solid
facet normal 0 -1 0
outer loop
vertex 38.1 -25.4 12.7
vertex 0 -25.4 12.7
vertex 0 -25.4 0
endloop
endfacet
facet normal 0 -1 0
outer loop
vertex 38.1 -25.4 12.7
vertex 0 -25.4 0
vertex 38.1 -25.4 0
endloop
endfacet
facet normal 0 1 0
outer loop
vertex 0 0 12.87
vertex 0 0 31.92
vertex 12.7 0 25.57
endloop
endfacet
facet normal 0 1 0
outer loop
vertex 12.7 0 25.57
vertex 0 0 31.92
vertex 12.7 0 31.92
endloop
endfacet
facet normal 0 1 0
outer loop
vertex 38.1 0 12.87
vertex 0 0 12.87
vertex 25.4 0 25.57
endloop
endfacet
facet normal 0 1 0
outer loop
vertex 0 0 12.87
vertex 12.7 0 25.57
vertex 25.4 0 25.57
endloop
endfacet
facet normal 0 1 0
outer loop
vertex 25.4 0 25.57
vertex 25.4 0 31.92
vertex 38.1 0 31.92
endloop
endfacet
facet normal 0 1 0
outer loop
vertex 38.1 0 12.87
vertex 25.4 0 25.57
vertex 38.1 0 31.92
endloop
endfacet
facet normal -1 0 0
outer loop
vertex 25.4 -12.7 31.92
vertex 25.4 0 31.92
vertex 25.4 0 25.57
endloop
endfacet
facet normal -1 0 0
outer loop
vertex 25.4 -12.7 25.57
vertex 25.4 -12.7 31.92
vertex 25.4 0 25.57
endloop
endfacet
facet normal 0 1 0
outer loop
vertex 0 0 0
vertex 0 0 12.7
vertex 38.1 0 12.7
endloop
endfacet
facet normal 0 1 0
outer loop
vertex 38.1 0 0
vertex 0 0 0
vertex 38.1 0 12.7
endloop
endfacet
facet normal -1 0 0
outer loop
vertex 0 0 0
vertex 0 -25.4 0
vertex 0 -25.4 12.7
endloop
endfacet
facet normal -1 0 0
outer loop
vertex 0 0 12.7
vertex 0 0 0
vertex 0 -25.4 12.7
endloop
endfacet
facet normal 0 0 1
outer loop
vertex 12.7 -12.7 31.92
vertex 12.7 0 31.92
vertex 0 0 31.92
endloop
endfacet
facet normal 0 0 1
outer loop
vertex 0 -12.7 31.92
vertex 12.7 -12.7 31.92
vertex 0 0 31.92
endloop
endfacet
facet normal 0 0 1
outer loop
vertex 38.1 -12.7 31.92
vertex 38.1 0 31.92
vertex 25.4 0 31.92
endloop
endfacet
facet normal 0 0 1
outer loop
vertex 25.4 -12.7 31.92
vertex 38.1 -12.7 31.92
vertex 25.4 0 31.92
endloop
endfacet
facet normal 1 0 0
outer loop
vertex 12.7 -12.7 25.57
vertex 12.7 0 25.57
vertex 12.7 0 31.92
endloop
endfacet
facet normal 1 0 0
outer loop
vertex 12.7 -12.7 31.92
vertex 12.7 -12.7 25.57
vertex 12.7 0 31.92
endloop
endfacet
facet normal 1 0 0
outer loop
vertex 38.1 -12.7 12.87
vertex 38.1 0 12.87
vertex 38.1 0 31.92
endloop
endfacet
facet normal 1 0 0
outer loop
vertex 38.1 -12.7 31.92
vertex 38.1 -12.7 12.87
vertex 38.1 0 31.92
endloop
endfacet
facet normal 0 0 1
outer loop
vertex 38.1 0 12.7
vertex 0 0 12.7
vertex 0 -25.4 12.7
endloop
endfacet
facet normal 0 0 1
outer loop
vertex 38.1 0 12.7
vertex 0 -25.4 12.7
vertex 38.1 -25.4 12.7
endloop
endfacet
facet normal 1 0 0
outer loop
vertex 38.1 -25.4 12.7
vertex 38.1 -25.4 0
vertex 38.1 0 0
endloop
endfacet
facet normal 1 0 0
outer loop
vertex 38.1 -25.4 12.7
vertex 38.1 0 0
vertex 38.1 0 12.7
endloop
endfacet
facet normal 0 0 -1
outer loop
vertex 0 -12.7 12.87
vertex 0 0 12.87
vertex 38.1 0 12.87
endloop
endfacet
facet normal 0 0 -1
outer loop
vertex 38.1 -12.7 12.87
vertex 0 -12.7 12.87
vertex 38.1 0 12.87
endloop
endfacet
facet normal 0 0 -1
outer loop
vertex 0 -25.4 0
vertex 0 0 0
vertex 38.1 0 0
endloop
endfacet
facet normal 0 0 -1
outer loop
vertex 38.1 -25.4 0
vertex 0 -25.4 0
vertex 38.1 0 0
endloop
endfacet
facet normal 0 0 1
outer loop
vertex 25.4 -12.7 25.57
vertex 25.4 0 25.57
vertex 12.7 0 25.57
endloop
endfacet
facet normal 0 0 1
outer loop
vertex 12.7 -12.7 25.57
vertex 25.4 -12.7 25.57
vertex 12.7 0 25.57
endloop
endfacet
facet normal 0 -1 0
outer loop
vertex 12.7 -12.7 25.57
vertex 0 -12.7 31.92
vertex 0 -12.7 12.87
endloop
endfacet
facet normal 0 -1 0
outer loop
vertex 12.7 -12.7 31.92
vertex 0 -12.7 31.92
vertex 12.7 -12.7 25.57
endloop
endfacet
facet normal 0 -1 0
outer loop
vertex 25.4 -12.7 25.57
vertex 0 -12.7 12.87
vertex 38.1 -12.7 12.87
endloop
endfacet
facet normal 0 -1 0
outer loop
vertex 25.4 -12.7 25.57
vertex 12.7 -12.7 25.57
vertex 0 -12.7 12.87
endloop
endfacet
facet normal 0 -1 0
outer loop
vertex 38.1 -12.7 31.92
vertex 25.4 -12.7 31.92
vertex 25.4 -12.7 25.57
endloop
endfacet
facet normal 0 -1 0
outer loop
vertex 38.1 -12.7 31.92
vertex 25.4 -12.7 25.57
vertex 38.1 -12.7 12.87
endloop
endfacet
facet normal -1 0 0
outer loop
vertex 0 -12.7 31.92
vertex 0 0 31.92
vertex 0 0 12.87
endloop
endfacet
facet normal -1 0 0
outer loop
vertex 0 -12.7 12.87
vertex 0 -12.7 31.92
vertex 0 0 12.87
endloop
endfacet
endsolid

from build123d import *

# Parameters (mm, degrees)
F0_W     = 38.1
F0_H     = 12.7
F1_DEPTH = 25.4
F3_DEPTH = 12.7


with BuildPart() as f1:
    # F0 (on Front) → F1 (new body)
    with BuildSketch(Plane.XZ):
        with Locations((19.05, 6.35)):
            Rectangle(F0_W, F0_H)
    extrude(amount=F1_DEPTH)


with BuildPart() as f3:
    # F2 (on Front) → F3 (new body)
    with BuildSketch(Plane.XZ):
        Polygon((0, 31.919826), (0, 12.869826), (38.1, 12.869826), (38.1, 31.919826), (25.4, 31.919826), (25.4, 25.569826), (12.7, 25.569826), (12.7, 31.919826), align=None)
    extrude(amount=F3_DEPTH)


solid = Compound([f1.part, f3.part])
